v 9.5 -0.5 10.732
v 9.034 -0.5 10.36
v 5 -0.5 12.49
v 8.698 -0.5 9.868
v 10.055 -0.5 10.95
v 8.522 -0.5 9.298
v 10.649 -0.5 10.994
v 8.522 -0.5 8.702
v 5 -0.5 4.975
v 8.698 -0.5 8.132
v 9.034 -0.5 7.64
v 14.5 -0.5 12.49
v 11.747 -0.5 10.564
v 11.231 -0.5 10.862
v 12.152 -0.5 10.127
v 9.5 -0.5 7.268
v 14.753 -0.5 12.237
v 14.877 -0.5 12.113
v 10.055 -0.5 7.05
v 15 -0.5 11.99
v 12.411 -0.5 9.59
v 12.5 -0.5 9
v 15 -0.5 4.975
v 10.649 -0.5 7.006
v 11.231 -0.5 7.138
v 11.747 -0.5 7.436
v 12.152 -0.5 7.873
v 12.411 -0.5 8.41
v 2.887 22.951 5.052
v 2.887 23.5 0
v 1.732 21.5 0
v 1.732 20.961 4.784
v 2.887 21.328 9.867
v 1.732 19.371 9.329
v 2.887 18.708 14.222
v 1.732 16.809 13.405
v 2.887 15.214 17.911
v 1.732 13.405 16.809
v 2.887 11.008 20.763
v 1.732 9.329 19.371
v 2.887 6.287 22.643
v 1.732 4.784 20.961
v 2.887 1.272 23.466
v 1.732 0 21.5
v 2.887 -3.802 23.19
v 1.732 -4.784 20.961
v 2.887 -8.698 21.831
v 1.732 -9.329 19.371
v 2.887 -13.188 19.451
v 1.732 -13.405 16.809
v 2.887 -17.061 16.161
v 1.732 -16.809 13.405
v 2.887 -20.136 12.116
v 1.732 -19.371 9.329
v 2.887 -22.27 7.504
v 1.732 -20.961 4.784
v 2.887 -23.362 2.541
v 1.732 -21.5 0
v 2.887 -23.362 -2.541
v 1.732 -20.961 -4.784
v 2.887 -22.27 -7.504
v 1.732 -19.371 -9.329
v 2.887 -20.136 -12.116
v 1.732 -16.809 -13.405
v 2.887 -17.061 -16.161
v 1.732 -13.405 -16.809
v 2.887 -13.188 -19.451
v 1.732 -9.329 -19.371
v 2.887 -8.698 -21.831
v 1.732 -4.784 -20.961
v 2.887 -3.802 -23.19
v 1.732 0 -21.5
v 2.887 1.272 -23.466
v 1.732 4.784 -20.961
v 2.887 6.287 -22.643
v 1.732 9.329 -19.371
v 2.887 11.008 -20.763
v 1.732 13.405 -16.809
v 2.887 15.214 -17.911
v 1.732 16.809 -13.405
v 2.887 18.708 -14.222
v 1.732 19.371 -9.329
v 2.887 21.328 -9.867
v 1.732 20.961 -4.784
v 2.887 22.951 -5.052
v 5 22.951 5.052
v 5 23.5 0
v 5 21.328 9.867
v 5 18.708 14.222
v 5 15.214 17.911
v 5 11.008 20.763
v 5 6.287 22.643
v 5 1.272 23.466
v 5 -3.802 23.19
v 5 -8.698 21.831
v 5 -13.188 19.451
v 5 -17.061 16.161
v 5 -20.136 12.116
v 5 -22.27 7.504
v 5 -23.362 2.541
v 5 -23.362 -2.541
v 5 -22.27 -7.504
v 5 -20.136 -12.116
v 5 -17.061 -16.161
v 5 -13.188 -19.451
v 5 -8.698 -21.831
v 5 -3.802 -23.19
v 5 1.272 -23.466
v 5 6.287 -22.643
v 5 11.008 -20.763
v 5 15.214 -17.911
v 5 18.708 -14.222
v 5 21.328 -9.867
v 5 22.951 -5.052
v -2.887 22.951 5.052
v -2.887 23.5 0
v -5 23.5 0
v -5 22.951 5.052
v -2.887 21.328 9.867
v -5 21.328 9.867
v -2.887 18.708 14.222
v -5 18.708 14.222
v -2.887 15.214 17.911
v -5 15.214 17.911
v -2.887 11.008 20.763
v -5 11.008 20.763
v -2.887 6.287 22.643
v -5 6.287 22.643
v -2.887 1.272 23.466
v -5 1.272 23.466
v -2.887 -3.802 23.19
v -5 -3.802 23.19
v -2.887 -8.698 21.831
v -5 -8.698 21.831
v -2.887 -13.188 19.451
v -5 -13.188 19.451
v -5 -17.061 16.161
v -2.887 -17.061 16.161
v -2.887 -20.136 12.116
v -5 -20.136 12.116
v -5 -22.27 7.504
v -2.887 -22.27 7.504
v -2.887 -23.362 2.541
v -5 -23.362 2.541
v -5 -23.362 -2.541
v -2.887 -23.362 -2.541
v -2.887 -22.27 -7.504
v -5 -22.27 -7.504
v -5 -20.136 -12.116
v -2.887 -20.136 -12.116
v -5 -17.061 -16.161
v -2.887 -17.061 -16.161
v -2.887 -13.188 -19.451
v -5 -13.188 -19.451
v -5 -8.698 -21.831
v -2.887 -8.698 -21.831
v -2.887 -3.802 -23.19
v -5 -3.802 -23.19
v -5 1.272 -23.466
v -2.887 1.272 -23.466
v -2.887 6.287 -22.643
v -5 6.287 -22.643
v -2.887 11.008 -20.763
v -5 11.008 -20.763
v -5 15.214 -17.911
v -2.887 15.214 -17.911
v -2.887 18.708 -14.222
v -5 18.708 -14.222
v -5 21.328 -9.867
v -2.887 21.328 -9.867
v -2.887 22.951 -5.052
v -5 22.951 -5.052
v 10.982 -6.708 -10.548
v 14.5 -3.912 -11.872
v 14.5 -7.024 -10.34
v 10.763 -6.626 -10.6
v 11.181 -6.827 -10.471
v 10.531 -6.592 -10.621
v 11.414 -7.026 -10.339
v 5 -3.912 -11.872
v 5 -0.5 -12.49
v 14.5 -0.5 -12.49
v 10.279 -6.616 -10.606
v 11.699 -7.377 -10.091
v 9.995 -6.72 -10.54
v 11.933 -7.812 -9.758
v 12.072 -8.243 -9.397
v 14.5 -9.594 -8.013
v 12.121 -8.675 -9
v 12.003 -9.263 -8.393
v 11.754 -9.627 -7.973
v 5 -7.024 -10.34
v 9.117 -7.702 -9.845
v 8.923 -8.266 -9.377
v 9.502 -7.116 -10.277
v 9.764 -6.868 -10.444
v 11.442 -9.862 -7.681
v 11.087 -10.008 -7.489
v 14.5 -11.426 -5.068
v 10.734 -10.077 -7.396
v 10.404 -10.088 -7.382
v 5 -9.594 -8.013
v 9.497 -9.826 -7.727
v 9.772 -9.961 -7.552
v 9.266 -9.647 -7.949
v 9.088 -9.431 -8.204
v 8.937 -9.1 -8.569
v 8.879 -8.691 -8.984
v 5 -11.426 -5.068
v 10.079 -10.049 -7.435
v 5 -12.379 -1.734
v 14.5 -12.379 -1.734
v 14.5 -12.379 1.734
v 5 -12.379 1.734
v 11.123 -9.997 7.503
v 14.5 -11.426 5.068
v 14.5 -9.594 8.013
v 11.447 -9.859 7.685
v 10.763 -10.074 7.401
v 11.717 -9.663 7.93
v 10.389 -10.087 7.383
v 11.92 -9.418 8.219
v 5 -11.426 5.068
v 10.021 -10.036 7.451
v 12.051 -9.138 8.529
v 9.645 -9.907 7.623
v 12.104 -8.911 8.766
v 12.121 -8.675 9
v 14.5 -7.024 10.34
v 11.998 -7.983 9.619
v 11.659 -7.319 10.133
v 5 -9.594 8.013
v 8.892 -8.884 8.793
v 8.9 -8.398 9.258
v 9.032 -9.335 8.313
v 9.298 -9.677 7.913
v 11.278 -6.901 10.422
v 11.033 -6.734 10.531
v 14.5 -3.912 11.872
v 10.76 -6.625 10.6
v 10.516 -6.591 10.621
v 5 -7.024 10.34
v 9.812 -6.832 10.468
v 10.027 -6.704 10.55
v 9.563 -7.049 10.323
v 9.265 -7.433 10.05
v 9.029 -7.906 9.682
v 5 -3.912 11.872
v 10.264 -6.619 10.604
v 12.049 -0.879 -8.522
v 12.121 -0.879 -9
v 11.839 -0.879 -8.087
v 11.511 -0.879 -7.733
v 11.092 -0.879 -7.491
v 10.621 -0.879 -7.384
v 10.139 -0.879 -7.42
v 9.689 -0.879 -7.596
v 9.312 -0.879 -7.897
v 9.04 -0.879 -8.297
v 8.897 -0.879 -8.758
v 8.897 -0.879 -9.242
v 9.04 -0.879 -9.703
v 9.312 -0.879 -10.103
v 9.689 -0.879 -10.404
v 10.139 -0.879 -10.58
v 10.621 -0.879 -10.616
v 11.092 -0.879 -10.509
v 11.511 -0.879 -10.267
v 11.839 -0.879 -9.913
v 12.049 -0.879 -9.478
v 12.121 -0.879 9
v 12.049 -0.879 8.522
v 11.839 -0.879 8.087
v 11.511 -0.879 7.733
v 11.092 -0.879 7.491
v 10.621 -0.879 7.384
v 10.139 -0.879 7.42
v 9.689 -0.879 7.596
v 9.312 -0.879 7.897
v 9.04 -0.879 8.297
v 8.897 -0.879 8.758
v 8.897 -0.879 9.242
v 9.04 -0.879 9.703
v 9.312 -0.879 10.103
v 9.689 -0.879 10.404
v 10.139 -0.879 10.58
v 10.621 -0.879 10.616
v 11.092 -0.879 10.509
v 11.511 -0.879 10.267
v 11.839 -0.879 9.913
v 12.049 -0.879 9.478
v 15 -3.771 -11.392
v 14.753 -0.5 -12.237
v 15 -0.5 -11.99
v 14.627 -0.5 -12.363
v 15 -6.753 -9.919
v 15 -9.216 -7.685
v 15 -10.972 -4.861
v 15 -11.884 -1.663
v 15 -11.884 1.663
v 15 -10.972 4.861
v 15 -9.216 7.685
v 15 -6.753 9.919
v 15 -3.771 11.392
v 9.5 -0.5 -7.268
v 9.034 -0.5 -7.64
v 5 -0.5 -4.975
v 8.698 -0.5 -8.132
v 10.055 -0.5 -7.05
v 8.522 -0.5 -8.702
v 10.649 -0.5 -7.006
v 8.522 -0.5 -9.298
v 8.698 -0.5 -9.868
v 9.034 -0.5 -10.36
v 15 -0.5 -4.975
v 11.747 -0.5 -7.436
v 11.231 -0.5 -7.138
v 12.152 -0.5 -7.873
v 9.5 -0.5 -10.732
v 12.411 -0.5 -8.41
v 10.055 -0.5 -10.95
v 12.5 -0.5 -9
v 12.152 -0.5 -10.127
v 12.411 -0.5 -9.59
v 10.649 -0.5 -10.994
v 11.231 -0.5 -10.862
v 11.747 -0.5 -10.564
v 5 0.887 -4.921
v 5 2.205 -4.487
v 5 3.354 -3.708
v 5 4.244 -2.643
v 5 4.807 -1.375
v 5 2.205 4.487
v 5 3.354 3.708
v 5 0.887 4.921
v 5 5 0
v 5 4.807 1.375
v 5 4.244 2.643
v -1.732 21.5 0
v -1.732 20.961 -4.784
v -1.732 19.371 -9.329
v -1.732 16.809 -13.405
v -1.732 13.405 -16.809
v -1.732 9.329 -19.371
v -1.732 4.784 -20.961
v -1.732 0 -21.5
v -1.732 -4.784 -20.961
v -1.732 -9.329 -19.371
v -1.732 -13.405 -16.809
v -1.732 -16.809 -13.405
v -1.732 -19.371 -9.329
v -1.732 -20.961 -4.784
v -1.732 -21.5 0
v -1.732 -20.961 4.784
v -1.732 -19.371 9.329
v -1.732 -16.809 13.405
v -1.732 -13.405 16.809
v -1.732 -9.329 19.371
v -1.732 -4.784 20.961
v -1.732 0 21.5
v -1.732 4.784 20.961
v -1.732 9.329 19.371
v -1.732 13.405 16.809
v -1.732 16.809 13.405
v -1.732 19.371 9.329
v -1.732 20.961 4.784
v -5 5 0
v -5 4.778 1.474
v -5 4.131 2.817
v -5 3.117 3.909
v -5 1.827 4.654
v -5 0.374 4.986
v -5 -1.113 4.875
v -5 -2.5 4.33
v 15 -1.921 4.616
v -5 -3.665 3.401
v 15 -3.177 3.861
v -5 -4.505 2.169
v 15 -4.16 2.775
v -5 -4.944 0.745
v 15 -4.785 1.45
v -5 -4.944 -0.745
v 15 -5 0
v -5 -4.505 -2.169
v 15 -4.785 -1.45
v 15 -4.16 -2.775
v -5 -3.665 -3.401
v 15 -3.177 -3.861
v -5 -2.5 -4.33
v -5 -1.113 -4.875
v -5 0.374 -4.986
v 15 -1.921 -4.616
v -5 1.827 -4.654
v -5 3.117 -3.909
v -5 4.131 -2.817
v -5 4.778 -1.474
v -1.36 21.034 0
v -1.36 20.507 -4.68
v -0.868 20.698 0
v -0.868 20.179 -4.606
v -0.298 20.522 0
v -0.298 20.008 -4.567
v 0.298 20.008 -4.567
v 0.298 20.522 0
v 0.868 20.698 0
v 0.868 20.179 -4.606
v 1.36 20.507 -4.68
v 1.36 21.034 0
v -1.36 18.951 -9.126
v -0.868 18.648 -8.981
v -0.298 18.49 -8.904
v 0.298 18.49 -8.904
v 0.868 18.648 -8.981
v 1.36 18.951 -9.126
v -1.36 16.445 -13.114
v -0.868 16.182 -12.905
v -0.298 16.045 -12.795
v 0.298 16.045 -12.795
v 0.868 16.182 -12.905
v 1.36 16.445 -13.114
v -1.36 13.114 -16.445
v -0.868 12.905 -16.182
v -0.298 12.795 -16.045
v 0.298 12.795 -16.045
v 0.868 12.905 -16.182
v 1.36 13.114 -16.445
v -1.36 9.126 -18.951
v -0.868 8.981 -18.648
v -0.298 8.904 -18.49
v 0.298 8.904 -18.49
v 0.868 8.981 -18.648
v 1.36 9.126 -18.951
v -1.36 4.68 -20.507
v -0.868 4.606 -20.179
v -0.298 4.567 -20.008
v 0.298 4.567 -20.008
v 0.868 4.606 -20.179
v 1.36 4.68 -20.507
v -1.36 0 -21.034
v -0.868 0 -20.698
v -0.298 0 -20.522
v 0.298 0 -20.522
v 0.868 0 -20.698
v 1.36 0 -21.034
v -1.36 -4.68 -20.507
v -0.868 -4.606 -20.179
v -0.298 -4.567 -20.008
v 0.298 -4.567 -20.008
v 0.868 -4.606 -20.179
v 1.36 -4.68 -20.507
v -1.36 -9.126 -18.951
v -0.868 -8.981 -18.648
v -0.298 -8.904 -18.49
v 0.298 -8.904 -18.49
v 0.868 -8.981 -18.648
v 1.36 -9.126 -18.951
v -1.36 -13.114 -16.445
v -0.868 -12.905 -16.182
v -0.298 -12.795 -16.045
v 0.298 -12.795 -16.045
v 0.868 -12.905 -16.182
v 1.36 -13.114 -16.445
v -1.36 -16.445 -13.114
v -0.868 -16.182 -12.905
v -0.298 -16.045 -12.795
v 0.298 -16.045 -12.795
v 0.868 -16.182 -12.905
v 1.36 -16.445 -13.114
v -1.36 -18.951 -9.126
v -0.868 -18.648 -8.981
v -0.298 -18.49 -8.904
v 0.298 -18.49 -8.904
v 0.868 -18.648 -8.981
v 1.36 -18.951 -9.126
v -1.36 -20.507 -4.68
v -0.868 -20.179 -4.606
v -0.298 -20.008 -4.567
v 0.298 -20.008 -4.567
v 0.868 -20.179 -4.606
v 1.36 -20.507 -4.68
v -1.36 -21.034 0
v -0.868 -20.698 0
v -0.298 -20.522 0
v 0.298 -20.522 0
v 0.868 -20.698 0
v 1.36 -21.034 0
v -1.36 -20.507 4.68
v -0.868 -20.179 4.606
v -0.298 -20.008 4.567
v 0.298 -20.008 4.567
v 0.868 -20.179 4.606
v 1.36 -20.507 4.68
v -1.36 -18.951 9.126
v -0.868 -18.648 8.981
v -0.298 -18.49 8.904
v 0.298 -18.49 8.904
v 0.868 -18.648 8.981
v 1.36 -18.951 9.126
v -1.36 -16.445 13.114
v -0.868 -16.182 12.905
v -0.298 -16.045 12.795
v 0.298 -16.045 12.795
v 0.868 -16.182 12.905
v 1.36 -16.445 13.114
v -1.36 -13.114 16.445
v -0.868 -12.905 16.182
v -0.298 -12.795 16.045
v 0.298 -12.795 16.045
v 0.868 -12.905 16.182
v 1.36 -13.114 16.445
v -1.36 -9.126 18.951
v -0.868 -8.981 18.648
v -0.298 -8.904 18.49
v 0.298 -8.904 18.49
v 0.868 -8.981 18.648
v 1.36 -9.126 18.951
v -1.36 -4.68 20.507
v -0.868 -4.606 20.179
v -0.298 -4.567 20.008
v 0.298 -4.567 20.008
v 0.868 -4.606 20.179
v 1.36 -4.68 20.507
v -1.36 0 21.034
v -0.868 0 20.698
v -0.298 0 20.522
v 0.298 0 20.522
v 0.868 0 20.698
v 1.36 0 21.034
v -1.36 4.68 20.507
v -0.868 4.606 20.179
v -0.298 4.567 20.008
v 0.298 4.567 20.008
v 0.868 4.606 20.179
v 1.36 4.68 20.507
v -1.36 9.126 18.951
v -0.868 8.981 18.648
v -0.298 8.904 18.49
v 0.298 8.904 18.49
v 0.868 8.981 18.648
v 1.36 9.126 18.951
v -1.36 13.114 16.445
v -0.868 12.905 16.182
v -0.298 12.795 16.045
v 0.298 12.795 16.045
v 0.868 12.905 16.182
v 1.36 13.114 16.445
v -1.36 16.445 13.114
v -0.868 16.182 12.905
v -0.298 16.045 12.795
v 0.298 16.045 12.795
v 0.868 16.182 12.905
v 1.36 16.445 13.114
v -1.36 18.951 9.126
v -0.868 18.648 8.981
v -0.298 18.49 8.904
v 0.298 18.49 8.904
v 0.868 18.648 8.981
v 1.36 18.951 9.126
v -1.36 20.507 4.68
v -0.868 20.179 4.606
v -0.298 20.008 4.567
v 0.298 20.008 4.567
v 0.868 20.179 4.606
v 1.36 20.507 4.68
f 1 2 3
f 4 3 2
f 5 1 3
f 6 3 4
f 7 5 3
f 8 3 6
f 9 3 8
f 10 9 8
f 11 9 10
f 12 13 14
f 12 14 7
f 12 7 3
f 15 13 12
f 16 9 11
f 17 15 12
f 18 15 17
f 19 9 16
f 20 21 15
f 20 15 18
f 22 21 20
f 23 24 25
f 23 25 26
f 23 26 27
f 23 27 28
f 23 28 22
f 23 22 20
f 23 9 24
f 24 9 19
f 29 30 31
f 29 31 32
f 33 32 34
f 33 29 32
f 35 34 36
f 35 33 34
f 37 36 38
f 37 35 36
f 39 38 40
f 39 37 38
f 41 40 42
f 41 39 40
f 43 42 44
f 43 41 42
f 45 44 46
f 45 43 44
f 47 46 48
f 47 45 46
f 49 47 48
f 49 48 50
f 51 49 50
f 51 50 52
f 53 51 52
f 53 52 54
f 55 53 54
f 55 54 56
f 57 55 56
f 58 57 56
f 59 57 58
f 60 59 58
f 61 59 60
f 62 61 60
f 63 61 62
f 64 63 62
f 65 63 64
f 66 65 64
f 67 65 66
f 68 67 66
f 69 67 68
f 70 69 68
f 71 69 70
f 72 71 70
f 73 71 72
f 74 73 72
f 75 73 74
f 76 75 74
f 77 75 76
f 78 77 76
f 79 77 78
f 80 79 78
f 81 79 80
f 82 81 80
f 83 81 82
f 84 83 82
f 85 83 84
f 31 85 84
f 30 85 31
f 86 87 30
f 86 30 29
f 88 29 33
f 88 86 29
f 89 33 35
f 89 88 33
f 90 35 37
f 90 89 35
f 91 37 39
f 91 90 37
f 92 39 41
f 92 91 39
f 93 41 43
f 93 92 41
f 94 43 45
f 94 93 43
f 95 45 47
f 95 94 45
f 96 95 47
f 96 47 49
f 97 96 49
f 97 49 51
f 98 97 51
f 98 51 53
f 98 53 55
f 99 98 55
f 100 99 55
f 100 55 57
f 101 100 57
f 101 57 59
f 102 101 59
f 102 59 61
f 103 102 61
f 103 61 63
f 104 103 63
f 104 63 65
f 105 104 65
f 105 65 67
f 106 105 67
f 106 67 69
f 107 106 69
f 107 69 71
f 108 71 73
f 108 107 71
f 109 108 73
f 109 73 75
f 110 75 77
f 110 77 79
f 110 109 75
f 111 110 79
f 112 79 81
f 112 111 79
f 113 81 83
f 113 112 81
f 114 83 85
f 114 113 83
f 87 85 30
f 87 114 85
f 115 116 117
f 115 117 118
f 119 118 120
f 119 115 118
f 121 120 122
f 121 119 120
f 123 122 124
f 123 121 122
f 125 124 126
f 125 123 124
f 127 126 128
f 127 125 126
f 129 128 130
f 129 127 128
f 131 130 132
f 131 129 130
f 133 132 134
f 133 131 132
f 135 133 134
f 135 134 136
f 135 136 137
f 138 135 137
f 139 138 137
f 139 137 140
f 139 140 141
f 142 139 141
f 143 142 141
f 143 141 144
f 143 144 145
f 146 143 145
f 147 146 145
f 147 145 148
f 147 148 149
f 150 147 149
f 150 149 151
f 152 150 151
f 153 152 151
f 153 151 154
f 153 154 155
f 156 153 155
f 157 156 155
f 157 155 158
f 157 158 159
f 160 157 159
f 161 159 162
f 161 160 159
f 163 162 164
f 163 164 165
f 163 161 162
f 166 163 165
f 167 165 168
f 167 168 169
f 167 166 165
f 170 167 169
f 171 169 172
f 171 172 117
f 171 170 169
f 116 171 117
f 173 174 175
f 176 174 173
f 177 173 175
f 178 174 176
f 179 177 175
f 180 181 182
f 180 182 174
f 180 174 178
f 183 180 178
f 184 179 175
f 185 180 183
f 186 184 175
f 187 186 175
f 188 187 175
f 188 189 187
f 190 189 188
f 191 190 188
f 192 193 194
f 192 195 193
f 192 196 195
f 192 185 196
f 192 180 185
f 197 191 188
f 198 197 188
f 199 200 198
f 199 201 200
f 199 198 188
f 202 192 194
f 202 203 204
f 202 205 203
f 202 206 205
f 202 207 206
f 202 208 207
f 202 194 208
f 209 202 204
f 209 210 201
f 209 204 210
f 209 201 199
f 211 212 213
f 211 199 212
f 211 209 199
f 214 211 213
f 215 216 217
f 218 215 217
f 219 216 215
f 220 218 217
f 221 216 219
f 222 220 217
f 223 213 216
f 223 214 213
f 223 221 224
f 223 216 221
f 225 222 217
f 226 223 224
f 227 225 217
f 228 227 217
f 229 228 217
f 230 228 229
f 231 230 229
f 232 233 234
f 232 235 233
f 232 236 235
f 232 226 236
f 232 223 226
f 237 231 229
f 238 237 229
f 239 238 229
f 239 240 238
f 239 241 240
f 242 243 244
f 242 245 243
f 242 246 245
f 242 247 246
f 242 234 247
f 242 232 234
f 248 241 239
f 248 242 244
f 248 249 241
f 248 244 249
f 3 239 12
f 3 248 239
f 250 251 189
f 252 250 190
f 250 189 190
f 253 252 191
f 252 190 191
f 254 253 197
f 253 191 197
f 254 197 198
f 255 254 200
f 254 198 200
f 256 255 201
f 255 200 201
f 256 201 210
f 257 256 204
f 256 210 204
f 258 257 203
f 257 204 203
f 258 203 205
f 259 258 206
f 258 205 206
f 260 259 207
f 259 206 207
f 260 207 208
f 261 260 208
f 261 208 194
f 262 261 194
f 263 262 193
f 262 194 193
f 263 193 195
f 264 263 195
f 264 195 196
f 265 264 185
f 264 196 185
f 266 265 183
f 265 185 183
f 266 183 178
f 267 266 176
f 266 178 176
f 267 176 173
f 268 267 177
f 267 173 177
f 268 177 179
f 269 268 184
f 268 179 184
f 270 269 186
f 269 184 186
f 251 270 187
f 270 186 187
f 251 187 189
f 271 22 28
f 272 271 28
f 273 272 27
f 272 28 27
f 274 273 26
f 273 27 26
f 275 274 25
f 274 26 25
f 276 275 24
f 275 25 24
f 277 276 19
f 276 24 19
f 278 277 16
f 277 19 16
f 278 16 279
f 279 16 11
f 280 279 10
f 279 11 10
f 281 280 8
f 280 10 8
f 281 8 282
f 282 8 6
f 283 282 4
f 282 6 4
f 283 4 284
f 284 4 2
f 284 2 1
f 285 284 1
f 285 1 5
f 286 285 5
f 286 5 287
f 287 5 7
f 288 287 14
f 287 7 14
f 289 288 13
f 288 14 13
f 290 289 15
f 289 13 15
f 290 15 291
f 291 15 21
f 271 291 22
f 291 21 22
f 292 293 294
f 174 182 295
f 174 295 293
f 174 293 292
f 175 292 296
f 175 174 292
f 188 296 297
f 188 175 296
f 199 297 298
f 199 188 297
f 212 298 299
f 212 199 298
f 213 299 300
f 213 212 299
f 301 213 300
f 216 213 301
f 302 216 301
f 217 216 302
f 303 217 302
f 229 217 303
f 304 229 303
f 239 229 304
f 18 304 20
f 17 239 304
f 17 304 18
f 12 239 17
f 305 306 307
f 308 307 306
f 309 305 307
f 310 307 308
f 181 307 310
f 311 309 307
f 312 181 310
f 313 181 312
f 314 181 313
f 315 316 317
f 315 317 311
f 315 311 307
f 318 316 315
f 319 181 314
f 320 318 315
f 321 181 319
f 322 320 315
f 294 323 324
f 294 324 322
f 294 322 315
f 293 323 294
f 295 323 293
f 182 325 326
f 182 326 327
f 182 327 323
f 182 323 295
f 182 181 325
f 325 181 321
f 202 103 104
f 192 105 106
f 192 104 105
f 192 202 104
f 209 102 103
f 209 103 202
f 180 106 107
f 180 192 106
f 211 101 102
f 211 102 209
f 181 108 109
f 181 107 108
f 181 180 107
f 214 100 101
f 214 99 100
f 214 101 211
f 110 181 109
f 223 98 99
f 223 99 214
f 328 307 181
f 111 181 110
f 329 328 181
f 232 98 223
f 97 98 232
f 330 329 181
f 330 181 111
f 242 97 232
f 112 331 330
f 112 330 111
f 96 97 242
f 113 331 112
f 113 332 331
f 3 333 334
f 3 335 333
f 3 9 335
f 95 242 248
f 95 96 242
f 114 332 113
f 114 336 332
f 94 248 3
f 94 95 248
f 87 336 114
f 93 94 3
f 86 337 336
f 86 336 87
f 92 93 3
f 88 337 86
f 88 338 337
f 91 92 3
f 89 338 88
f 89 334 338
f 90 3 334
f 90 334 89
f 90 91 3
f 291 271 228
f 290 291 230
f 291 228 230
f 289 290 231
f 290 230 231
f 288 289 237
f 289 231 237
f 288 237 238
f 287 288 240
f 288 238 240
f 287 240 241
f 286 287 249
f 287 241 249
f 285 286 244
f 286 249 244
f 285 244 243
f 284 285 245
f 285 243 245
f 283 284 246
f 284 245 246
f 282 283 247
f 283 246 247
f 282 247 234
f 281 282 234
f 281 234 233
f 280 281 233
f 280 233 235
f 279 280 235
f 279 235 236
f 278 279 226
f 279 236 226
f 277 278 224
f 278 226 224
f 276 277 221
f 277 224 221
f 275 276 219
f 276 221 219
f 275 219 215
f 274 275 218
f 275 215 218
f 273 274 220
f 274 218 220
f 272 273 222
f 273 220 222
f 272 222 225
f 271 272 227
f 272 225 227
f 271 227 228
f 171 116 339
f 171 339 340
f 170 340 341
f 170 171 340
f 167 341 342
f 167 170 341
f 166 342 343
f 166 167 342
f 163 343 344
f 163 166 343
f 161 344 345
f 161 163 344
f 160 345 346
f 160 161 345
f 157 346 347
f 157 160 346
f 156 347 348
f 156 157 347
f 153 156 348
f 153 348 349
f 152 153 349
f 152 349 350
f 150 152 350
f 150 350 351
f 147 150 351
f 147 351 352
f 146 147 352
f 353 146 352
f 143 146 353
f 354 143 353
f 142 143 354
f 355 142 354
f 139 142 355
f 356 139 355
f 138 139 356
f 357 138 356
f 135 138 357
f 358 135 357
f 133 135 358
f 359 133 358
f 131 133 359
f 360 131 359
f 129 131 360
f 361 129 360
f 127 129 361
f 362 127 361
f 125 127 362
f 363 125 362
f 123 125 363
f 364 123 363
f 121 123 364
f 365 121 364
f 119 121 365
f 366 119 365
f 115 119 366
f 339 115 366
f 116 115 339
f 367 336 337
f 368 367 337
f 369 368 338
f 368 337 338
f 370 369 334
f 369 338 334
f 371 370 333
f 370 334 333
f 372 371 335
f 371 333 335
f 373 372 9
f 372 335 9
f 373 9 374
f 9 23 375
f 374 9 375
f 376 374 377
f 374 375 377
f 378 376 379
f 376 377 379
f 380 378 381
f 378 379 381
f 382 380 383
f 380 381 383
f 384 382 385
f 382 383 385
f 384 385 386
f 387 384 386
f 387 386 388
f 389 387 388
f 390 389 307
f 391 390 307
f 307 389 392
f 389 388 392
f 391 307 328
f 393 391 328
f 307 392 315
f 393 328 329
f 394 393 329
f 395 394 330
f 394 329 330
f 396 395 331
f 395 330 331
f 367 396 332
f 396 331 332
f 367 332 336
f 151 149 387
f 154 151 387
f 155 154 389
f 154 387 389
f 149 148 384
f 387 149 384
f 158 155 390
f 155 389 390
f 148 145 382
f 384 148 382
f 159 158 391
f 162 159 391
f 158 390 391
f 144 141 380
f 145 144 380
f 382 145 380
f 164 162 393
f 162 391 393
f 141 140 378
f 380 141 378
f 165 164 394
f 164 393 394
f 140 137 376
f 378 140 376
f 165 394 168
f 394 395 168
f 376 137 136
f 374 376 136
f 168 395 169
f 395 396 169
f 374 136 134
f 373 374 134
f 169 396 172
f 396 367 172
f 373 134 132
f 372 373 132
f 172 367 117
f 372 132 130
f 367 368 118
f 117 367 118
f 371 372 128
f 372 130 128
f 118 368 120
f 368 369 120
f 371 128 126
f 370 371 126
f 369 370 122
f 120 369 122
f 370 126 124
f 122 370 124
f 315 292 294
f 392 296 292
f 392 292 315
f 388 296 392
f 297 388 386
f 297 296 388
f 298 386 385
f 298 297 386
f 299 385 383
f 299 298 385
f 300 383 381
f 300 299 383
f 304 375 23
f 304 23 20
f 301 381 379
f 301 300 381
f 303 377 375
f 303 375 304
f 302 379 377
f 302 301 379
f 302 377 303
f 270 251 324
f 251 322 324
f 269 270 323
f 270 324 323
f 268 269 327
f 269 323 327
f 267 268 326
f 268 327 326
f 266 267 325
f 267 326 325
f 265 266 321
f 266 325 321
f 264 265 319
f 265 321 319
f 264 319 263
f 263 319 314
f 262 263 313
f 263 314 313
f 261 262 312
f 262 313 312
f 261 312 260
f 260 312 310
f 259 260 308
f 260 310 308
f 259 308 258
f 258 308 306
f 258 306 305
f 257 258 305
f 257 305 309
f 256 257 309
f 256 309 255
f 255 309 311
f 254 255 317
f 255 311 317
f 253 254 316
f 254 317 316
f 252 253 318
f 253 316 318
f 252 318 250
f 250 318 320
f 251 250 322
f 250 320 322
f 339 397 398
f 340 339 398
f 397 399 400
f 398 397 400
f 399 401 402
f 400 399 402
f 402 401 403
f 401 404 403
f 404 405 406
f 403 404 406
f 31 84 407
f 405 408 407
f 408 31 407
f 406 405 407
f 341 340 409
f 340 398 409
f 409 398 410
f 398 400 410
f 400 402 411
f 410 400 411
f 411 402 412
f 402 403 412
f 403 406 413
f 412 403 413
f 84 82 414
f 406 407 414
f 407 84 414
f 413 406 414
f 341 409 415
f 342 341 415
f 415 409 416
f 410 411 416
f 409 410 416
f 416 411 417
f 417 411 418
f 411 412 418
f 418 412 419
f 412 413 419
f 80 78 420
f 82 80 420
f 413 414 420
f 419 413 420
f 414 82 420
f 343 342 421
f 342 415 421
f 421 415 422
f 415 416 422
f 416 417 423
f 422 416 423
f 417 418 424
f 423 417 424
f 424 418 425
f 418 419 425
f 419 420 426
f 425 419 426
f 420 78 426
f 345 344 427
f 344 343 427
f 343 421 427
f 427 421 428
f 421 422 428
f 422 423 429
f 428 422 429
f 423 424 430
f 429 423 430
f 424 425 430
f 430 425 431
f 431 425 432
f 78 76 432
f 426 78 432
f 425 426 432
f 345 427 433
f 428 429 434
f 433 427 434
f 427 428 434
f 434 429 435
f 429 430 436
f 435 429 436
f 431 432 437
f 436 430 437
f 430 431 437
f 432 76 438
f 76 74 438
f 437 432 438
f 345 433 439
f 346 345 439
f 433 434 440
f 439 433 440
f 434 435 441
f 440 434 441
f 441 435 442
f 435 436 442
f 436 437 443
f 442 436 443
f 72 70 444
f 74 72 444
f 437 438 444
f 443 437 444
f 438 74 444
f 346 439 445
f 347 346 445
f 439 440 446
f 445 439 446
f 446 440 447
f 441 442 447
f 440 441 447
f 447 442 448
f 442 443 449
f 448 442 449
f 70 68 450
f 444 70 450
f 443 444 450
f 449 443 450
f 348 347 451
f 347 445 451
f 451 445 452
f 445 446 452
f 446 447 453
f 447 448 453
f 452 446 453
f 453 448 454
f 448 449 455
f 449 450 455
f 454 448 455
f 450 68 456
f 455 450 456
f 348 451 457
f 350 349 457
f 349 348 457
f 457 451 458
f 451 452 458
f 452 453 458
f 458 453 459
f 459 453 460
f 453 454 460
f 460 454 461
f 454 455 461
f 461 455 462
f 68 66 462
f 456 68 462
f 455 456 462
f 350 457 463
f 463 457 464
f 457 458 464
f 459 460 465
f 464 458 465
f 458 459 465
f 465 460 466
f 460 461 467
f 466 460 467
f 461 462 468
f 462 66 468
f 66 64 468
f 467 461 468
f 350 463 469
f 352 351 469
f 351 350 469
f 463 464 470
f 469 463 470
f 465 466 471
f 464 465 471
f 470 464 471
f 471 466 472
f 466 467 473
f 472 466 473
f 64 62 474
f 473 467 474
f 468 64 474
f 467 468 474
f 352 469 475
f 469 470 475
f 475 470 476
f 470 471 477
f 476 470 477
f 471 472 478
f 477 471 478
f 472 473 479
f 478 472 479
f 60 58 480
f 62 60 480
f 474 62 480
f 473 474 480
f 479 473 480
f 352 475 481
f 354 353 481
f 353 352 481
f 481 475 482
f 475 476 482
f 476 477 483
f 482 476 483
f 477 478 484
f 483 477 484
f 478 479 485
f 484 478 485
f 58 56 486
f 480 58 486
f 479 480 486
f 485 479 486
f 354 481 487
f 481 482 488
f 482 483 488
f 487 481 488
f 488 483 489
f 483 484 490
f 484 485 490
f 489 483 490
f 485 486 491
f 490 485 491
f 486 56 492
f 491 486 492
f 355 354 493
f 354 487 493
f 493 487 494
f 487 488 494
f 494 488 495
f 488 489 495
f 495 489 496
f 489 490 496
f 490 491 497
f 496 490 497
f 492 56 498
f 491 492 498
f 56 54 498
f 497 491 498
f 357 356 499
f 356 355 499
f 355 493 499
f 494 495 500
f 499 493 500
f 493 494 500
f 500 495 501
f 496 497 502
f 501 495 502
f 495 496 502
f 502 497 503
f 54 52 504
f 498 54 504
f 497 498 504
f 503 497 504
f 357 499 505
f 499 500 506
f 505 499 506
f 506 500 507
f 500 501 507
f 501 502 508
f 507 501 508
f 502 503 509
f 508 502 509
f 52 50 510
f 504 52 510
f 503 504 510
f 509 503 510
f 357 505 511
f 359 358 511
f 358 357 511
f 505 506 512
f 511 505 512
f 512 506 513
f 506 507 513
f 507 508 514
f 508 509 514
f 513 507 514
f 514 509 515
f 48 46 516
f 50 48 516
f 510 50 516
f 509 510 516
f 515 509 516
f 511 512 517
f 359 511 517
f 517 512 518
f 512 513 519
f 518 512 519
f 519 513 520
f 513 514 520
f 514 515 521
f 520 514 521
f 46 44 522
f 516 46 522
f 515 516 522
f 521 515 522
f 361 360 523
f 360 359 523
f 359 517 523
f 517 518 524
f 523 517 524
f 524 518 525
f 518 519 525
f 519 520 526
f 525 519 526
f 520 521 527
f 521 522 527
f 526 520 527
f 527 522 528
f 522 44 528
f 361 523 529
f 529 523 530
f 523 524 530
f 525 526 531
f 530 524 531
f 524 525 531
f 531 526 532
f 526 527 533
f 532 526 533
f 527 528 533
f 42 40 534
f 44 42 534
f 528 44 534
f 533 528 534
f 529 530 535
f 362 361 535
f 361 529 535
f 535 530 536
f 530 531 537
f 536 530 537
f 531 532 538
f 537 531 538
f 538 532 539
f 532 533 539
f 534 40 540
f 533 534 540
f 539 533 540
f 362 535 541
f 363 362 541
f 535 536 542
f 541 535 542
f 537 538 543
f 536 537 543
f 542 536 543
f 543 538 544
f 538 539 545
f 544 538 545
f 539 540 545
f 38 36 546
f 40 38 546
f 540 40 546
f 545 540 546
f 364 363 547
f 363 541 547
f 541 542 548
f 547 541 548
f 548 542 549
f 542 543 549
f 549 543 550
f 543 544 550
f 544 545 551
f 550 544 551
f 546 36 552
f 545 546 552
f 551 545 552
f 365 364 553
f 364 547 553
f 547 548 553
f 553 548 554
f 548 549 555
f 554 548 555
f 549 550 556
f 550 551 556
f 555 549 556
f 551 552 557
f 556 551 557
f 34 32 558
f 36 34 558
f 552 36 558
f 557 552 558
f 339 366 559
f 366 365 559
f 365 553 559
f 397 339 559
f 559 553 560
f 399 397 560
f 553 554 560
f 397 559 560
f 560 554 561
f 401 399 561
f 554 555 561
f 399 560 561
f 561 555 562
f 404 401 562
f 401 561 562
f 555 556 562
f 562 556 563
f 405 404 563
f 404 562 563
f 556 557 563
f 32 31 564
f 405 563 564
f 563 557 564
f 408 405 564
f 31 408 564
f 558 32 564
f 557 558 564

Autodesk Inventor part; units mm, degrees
sketch "Sketch_1" plane through (0, 0, 0) normal (0, 0, 1) x (1, 0, 0)
  line L0 (5, 0) -> (-5, 0)
  line L1 (-5, 0) -> (-5, 23.5)
  line L2 (-5, 23.5) -> (-2.8868, 23.5)
  line L3 (-2.8868, 23.5) -> (-1.7321, 21.5)
  arc A0 (-1.7321, 21.5) -> (1.7321, 21.5) centre (0, 22.5) ccw
  line L4 (1.7321, 21.5) -> (2.8868, 23.5)
  line L5 (2.8868, 23.5) -> (5, 23.5)
  line L6 (5, 23.5) -> (5, 0)
  line L7 (5, 0) -> (-5, 0)
revolve "Revolution1" add sketch "Sketch_1" angle 360 about axis through (5, 0, 0) along (1, 0, 0)
sketch "Sketch_2" plane through (0, 0, 0) normal (0, 0, 1) x (1, 0, 0)
  line L0 (5, 0) -> (15, 0)
  line L1 (15, 0) -> (15, -12)
  line L2 (15, -12) -> (14.5, -12.5)
  line L3 (14.5, -12.5) -> (5, -12.5)
  line L4 (5, -12.5) -> (5, 0)
  line L5 (5, 0) -> (15, 0)
revolve "Revolution2" add sketch "Sketch_2" angle 180 mid plane about axis through (5, 0, 0) along (1, 0, 0)
sketch "Sketch_3" plane through (0, 0, 0) normal (0, 0, 1) x (1, 0, 0)
  line L0 (5, -0.5) -> (15, -0.5)
  line L1 (15, -0.5) -> (15, 0)
  line L2 (15, 0) -> (5, 0)
  line L3 (5, 0) -> (5, -0.5)
extrude "Extrusion1" cut sketch "Sketch_3" along normal mid plane 50
sketch "Sketch_4" plane through (0, 0, 0) normal (0, 0, 1) x (1, 0, 0)
  line L0 (15, 0) -> (-5, 0)
  line L1 (-5, 0) -> (-5, 5)
  line L2 (-5, 5) -> (15, 5)
  line L3 (15, 5) -> (15, 0)
  line L4 (15, 0) -> (-5, 0)
revolve "Revolution3" cut sketch "Sketch_4" angle 360 about axis through (15, 0, 0) along (1, 0, 0)
sketch "Sketch_5" plane through (0, 0, 9) normal (0, 0, 1) x (1, 0, 0)
  line L0 (10.5, -12.5) -> (10.5, -0.5)
  line L1 (10.5, -0.5) -> (12.5, -0.5)
  line L2 (12.5, -0.5) -> (12.121, -0.879)
  line L3 (12.121, -0.879) -> (12.121, -12.121)
  line L4 (12.121, -12.121) -> (12.5, -12.5)
  line L5 (12.5, -12.5) -> (10.5, -12.5)
  line L6 (10.5, -12.5) -> (10.5, -0.5)
revolve "Revolution4" cut sketch "Sketch_5" angle 360 about axis through (10.5, -12.5, 9) along (0, -1, 0)
thread "Thread1" size "M4x0.7" class "6H" standard "ISO Metric profile" length 11.242
sketch "Sketch_6" plane through (0, 0, -9) normal (0, 0, 1) x (1, 0, 0)
  line L0 (10.5, -12.5) -> (10.5, -0.5)
  line L1 (10.5, -0.5) -> (12.5, -0.5)
  line L2 (12.5, -0.5) -> (12.121, -0.879)
  line L3 (12.121, -0.879) -> (12.121, -12.121)
  line L4 (12.121, -12.121) -> (12.5, -12.5)
  line L5 (12.5, -12.5) -> (10.5, -12.5)
  line L6 (10.5, -12.5) -> (10.5, -0.5)
revolve "Revolution5" cut sketch "Sketch_6" angle 360 about axis through (10.5, -12.5, -9) along (0, -1, 0)
thread "Thread2" size "M4x0.7" class "6H" standard "ISO Metric profile" length 11.242
ref_plane "part1_to_part2_XY" through (5, 0, 0) normal (1, 0, 0) x (0, 0, -1)
ref_plane "part1_to_part2_YZ" through (5, 0, 0) normal (0, 0, -1) x (0, 1, 0)
ref_plane "part1_to_part2_ZX" through (5, 0, 0) normal (0, 1, 0) x (1, 0, 0)
properties part number "MBRAC45-2-10p1"
